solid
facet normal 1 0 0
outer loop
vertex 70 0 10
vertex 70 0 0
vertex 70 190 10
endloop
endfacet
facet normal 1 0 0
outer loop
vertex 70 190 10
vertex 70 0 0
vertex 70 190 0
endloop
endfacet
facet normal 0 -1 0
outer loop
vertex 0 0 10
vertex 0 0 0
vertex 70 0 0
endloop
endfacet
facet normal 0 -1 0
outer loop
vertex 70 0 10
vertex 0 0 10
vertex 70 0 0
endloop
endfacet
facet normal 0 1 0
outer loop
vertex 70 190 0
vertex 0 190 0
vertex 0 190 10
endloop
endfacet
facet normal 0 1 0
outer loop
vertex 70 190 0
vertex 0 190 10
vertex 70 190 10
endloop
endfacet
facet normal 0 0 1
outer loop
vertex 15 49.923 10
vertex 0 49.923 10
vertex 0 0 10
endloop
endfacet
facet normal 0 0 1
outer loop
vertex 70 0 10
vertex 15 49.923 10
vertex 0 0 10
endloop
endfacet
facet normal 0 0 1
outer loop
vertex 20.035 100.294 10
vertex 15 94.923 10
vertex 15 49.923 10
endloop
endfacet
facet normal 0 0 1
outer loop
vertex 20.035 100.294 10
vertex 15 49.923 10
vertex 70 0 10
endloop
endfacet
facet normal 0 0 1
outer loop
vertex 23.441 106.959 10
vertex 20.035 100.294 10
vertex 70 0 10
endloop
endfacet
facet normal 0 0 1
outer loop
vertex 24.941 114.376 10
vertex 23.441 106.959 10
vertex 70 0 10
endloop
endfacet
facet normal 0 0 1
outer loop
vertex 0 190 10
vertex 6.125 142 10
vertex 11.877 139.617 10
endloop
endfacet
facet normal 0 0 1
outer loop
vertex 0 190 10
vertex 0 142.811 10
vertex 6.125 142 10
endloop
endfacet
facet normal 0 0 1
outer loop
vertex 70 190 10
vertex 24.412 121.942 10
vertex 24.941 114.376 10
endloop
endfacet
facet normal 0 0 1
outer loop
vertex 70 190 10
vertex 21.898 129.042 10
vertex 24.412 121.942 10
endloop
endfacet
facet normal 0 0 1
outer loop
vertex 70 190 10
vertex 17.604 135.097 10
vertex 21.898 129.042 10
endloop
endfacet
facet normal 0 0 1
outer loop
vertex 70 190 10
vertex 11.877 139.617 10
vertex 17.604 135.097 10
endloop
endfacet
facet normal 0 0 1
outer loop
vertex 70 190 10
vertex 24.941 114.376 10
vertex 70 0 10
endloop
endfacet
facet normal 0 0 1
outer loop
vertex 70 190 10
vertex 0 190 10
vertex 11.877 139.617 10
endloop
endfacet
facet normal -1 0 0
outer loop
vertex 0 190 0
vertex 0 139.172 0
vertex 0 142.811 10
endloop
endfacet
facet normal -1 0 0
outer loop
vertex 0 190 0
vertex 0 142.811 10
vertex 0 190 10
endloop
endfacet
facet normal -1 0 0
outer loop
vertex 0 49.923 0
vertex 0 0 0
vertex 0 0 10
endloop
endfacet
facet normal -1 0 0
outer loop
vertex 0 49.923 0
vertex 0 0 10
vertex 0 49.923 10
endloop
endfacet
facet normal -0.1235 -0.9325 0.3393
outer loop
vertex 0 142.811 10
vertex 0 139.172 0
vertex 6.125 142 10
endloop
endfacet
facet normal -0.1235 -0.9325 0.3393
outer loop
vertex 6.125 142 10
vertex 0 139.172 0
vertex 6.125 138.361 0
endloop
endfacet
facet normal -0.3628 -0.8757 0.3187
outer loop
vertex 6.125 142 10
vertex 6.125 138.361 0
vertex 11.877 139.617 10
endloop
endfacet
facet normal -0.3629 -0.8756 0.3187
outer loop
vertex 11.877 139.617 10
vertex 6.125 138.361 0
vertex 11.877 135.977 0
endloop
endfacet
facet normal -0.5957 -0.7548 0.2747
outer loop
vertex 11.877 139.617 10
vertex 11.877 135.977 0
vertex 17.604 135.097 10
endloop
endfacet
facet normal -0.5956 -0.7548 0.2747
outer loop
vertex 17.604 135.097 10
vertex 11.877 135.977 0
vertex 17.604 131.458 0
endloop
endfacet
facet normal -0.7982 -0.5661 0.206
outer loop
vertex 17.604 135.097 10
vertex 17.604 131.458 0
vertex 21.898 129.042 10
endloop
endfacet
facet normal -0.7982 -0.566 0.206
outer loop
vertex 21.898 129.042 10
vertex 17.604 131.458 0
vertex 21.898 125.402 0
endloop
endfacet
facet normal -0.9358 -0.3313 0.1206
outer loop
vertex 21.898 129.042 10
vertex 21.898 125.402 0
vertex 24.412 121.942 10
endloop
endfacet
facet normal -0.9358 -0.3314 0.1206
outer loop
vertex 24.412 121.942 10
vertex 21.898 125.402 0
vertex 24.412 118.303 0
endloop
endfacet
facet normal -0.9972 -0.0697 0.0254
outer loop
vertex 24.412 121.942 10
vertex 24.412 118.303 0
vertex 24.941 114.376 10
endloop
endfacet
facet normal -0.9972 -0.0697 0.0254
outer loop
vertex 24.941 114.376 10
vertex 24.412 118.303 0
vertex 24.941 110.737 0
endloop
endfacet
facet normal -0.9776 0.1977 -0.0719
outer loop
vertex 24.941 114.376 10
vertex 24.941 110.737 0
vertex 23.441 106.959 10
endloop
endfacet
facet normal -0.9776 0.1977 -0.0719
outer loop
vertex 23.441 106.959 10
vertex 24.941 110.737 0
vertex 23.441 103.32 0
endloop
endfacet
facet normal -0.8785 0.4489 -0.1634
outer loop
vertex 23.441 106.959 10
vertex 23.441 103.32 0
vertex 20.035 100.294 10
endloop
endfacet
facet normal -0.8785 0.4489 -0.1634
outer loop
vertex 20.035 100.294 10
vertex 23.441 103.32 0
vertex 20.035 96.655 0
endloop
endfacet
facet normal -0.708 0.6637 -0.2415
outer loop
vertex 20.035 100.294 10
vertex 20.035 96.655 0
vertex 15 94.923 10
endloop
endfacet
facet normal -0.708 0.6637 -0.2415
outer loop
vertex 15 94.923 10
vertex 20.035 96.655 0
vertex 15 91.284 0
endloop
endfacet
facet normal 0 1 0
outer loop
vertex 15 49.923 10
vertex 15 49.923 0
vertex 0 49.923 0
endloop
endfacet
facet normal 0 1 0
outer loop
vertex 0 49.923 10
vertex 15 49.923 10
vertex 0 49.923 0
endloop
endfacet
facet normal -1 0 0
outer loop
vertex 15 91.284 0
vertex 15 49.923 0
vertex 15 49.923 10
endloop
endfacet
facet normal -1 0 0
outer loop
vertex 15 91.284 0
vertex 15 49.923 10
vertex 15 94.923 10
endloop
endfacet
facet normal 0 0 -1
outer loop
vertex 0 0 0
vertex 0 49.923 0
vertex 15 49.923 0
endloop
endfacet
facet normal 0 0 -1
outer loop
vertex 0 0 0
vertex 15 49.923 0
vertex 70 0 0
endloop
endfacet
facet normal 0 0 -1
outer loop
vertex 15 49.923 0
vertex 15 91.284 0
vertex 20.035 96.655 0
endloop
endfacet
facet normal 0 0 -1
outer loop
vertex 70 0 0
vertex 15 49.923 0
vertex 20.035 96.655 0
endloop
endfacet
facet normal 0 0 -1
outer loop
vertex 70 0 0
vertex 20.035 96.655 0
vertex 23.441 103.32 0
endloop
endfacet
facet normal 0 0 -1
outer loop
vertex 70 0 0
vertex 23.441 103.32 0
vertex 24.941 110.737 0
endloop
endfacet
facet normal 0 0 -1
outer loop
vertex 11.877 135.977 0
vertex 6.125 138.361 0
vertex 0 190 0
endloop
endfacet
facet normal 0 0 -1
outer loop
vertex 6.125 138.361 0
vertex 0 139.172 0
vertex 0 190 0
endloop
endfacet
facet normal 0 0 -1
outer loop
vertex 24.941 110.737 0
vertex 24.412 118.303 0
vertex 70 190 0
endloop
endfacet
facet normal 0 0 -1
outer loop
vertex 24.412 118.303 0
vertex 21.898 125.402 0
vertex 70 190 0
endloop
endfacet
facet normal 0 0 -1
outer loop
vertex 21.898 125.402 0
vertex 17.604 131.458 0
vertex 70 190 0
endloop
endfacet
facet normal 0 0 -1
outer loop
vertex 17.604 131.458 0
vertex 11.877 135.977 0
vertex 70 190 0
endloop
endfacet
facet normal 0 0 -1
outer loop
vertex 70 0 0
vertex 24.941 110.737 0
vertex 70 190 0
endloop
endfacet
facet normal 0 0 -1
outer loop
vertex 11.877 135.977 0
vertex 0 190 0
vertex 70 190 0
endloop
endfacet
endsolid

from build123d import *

# Parameters (mm, degrees)
ESQUISSE1_W             = 70
ESQUISSE1_H             = 190
BOSS_EXTRU_1_DEPTH      = 10
ENL_V_MAT_EXTRU_1_DEPTH = 203.731349327
ESQUISSE3_W             = 15
ESQUISSE3_H             = 45
ENL_V_MAT_EXTRU_2_DEPTH = 203.731349327


with BuildPart() as part:
    # Esquisse1 → Boss.-Extru.1 (new body)
    with BuildSketch(Plane.XY):
        with Locations((35, 95)):
            Rectangle(ESQUISSE1_W, ESQUISSE1_H)
    extrude(amount=BOSS_EXTRU_1_DEPTH)

    # Esquisse2 → Enlèv. mat.-Extru.1 (cut, through all)
    with BuildSketch(Plane(origin=(0, 0, 0), x_dir=(1, 0, 0), z_dir=(0, -0.34202014332566943, -0.9396926207859081))):
        with BuildLine():
            Line((0, -80.778483455), (0, -130.778483455))
            ThreePointArc((0, -130.778483455), (25, -105.778483455), (0, -80.778483455))
        make_face()
    extrude(amount=-ENL_V_MAT_EXTRU_1_DEPTH, mode=Mode.SUBTRACT)

    # Esquisse3 → Enlèv. mat.-Extru.2 (cut, through all)
    with BuildSketch(Plane(origin=(0, 0, 0), x_dir=(-1, 0, 0), z_dir=(0, 0, -1))):
        with Locations((-7.5, 72.423257792)):
            Rectangle(ESQUISSE3_W, ESQUISSE3_H)
    extrude(amount=-ENL_V_MAT_EXTRU_2_DEPTH, mode=Mode.SUBTRACT)


solid = part.part
